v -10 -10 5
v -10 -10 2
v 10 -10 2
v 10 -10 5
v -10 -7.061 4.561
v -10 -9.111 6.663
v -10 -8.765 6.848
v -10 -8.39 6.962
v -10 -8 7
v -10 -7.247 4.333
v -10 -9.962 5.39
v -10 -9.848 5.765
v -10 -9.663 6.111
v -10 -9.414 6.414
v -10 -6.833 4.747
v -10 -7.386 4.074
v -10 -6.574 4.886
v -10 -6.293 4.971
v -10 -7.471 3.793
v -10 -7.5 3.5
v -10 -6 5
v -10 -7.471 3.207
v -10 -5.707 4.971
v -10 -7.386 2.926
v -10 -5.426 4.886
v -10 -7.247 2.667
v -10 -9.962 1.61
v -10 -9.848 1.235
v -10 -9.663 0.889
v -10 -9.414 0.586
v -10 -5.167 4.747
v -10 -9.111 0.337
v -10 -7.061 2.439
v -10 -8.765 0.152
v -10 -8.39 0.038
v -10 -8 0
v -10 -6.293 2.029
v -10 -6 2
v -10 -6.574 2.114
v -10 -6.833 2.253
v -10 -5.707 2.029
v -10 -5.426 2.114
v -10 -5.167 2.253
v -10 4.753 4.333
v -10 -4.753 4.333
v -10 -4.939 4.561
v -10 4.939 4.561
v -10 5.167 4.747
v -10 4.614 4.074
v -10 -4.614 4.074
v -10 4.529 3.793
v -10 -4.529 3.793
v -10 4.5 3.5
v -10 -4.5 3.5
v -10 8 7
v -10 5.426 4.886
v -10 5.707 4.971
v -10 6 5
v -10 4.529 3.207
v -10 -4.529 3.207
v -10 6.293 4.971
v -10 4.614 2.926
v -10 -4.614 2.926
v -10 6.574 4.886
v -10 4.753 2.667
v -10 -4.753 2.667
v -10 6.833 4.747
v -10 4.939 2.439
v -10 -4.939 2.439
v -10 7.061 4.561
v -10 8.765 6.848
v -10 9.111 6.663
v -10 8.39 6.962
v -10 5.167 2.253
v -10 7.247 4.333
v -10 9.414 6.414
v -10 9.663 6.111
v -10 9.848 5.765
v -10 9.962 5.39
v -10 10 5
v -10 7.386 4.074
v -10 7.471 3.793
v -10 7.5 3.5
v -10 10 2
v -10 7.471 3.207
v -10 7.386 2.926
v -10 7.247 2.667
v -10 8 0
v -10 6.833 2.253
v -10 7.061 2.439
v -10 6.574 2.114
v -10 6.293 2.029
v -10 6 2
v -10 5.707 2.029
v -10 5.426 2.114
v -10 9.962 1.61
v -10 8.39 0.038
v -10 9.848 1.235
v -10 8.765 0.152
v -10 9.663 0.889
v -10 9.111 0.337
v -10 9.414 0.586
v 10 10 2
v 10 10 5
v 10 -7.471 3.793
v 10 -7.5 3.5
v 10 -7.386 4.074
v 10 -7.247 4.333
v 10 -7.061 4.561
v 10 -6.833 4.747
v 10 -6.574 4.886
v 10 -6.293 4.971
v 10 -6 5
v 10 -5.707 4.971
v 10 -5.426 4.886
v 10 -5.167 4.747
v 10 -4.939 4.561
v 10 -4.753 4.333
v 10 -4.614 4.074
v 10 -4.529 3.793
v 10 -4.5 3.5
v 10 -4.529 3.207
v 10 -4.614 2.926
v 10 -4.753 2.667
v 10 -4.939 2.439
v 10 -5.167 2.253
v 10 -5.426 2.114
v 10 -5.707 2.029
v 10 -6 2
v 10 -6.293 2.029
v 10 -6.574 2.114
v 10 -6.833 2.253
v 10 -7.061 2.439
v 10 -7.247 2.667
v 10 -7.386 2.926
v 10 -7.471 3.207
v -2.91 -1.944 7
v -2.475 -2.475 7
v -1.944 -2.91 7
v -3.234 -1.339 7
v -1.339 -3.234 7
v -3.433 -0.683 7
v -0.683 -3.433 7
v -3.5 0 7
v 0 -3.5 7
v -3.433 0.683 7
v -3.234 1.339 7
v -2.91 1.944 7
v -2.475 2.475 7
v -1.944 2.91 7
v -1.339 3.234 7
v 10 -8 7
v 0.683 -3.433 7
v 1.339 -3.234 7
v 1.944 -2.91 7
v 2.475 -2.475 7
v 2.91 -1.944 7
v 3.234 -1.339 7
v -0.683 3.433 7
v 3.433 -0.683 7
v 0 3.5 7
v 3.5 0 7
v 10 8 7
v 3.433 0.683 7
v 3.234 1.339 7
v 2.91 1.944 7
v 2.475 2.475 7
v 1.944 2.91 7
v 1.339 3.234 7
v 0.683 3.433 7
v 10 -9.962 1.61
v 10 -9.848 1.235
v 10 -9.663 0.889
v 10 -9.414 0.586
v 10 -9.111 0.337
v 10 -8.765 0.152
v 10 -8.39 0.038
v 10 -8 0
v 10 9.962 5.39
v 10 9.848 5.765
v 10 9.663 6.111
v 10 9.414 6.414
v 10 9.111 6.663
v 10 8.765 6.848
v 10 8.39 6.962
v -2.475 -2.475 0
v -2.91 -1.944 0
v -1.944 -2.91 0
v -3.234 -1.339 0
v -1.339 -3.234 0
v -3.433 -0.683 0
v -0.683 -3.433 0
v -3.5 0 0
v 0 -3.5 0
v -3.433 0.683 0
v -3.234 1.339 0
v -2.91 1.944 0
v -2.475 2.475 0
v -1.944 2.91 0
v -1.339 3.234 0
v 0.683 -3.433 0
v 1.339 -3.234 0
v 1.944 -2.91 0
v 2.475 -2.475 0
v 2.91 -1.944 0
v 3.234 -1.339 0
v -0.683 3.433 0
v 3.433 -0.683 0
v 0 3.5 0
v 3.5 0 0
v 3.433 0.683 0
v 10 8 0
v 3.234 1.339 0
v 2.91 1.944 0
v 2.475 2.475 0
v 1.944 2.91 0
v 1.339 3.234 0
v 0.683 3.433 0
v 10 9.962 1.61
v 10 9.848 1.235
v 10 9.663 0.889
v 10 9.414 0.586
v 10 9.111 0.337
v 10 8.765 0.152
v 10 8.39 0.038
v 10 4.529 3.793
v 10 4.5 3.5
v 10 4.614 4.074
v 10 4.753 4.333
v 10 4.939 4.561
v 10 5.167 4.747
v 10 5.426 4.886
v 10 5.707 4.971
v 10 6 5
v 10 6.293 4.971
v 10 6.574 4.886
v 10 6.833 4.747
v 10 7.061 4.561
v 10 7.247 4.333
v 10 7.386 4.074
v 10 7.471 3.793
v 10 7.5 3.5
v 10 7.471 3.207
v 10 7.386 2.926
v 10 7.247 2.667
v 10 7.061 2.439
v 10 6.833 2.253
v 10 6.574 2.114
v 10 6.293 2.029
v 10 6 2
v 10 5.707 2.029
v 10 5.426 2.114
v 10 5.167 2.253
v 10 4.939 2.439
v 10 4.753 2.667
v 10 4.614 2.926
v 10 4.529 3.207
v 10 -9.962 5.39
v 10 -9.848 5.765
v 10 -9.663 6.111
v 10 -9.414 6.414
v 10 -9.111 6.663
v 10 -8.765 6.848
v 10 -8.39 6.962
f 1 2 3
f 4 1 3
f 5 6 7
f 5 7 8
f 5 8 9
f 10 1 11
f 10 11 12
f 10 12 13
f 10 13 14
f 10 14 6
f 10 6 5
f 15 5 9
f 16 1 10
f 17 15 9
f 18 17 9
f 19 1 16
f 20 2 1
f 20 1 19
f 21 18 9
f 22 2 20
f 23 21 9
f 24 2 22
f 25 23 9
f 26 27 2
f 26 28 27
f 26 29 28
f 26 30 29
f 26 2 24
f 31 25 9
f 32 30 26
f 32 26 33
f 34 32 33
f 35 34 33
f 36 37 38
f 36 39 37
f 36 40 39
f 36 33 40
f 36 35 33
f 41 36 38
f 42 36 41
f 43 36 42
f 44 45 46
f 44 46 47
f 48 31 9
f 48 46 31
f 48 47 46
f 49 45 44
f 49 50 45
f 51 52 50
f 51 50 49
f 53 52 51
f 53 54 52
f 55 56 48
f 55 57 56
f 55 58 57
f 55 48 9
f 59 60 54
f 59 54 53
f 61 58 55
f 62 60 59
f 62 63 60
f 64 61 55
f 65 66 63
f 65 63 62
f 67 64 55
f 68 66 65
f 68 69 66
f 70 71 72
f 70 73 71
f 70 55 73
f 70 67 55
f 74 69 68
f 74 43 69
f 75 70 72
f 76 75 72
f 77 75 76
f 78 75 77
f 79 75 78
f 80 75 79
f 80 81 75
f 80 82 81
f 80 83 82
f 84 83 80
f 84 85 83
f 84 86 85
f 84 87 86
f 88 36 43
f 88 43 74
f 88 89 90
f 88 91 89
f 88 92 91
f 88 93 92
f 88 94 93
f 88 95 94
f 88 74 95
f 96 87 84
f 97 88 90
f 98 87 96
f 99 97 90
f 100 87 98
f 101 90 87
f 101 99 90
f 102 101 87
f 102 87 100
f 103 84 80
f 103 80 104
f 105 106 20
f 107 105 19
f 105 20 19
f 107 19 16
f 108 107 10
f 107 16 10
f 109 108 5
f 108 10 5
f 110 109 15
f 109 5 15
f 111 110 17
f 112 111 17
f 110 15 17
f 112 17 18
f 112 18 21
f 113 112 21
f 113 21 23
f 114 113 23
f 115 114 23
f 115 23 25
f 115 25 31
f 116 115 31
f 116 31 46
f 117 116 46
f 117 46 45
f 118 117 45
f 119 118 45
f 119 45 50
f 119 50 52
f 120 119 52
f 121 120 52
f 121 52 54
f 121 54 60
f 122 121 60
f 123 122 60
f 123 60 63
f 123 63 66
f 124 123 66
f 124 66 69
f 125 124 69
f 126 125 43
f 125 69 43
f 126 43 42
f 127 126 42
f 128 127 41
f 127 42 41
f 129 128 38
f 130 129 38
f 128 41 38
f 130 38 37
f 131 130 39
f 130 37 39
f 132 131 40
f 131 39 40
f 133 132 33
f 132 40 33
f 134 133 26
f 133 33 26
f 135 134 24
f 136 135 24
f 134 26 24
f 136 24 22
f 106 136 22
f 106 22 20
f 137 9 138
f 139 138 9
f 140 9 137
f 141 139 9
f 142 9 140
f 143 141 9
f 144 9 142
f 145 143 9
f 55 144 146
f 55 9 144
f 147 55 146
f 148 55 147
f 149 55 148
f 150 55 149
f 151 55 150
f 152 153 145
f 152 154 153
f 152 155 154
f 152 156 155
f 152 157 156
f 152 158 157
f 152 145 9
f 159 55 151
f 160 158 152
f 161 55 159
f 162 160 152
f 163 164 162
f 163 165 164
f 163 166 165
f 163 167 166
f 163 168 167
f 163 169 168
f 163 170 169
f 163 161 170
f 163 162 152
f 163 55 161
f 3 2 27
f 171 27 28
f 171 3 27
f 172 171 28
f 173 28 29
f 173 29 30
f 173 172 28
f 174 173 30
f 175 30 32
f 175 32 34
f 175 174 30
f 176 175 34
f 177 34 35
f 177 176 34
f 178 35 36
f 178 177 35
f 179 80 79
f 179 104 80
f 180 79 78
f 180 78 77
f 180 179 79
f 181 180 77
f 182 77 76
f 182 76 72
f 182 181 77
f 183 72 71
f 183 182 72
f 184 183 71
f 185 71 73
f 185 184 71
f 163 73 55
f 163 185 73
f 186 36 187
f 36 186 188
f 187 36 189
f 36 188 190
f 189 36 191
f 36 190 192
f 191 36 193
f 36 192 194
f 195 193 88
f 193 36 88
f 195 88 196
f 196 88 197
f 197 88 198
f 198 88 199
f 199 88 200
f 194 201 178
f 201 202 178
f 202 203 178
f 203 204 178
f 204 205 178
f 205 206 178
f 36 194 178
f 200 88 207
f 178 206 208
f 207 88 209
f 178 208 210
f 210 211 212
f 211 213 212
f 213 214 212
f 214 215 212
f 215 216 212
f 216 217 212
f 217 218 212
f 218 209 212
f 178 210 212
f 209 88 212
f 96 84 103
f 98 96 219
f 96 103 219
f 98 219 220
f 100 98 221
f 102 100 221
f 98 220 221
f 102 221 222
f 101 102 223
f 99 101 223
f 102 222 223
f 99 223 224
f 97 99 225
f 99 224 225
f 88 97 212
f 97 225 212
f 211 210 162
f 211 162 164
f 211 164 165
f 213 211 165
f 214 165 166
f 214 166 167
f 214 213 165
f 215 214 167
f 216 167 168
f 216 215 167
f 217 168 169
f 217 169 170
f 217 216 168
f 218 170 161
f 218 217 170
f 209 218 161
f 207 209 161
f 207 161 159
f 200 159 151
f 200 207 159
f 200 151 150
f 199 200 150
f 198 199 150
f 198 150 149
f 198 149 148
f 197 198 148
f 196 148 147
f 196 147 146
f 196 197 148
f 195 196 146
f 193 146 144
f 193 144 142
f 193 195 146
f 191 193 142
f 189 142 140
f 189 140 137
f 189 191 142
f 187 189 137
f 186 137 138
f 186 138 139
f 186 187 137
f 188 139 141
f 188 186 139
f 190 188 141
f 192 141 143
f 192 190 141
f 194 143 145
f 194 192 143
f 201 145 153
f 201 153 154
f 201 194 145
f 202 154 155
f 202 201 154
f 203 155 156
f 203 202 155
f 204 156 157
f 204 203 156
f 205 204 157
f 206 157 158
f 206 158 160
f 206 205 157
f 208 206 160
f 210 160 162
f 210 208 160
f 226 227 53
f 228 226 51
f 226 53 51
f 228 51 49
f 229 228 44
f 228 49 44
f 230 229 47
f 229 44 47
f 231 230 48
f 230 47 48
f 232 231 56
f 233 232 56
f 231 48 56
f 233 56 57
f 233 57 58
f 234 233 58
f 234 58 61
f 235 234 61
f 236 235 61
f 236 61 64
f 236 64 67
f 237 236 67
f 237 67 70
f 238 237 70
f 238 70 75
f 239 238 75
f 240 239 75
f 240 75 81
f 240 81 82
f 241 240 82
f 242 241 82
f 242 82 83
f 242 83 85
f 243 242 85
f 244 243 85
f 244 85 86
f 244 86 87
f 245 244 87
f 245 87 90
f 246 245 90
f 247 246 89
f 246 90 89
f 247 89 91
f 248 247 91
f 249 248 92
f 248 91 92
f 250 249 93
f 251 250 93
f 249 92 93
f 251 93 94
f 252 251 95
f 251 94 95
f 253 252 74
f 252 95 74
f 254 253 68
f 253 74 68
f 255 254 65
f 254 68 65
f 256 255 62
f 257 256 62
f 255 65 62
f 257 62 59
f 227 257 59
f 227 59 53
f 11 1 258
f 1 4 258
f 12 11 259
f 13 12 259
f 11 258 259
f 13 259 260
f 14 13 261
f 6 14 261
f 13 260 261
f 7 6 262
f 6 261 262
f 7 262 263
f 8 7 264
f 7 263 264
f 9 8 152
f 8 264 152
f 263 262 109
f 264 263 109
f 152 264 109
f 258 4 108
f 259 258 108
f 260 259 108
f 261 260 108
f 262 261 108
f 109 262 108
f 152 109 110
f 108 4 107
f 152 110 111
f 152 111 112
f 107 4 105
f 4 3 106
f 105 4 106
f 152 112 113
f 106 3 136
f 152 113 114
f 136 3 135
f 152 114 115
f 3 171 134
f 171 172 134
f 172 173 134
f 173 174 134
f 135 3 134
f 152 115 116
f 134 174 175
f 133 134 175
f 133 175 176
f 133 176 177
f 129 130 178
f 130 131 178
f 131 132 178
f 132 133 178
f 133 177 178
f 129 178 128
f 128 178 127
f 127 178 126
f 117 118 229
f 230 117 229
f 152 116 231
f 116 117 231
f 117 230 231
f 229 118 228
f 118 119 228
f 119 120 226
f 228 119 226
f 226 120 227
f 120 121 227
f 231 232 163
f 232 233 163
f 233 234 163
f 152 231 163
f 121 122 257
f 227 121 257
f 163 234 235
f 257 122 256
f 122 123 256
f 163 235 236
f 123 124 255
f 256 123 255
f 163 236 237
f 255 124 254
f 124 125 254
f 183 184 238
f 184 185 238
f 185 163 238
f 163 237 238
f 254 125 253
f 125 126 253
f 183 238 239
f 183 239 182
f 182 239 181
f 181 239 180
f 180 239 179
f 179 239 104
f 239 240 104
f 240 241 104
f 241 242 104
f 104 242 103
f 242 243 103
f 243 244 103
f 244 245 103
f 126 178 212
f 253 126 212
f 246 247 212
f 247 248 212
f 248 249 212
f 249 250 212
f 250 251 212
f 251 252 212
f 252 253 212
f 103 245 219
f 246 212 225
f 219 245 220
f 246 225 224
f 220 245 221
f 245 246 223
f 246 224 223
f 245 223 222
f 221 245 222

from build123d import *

# Parameters (mm, degrees)
F0_W     = 20
F0_H     = 20
F0_R     = 3.5
F1_DEPTH = 7
F2_R     = 2
F3_R     = 1.5
F4_DEPTH = 25


with BuildPart() as f1:
    # F0 (on Top) → F1 (new body)
    with BuildSketch(Plane.XY):
        Rectangle(F0_W, F0_H)
        Circle(F0_R, mode=Mode.SUBTRACT)
    extrude(amount=F1_DEPTH)

    # F2
    f2_edges = [f1.edges().sort_by_distance(p)[0] for p in [
        (0, -10, 7),
        (0, -10, 0),
        (0, 10, 7),
        (0, 10, 0),
    ]]
    fillet(f2_edges, radius=F2_R)

    # F3 (on face) → F4 (cut)
    with BuildSketch(Plane(origin=(-10, 0, 0), x_dir=(0, -1, 0), z_dir=(-1, 0, 0))):
        with Locations((-6, 3.5)):
            Circle(F3_R)
        with Locations((6, 3.5)):
            Circle(F3_R)
    extrude(amount=-F4_DEPTH, mode=Mode.SUBTRACT)


solid = f1.part
